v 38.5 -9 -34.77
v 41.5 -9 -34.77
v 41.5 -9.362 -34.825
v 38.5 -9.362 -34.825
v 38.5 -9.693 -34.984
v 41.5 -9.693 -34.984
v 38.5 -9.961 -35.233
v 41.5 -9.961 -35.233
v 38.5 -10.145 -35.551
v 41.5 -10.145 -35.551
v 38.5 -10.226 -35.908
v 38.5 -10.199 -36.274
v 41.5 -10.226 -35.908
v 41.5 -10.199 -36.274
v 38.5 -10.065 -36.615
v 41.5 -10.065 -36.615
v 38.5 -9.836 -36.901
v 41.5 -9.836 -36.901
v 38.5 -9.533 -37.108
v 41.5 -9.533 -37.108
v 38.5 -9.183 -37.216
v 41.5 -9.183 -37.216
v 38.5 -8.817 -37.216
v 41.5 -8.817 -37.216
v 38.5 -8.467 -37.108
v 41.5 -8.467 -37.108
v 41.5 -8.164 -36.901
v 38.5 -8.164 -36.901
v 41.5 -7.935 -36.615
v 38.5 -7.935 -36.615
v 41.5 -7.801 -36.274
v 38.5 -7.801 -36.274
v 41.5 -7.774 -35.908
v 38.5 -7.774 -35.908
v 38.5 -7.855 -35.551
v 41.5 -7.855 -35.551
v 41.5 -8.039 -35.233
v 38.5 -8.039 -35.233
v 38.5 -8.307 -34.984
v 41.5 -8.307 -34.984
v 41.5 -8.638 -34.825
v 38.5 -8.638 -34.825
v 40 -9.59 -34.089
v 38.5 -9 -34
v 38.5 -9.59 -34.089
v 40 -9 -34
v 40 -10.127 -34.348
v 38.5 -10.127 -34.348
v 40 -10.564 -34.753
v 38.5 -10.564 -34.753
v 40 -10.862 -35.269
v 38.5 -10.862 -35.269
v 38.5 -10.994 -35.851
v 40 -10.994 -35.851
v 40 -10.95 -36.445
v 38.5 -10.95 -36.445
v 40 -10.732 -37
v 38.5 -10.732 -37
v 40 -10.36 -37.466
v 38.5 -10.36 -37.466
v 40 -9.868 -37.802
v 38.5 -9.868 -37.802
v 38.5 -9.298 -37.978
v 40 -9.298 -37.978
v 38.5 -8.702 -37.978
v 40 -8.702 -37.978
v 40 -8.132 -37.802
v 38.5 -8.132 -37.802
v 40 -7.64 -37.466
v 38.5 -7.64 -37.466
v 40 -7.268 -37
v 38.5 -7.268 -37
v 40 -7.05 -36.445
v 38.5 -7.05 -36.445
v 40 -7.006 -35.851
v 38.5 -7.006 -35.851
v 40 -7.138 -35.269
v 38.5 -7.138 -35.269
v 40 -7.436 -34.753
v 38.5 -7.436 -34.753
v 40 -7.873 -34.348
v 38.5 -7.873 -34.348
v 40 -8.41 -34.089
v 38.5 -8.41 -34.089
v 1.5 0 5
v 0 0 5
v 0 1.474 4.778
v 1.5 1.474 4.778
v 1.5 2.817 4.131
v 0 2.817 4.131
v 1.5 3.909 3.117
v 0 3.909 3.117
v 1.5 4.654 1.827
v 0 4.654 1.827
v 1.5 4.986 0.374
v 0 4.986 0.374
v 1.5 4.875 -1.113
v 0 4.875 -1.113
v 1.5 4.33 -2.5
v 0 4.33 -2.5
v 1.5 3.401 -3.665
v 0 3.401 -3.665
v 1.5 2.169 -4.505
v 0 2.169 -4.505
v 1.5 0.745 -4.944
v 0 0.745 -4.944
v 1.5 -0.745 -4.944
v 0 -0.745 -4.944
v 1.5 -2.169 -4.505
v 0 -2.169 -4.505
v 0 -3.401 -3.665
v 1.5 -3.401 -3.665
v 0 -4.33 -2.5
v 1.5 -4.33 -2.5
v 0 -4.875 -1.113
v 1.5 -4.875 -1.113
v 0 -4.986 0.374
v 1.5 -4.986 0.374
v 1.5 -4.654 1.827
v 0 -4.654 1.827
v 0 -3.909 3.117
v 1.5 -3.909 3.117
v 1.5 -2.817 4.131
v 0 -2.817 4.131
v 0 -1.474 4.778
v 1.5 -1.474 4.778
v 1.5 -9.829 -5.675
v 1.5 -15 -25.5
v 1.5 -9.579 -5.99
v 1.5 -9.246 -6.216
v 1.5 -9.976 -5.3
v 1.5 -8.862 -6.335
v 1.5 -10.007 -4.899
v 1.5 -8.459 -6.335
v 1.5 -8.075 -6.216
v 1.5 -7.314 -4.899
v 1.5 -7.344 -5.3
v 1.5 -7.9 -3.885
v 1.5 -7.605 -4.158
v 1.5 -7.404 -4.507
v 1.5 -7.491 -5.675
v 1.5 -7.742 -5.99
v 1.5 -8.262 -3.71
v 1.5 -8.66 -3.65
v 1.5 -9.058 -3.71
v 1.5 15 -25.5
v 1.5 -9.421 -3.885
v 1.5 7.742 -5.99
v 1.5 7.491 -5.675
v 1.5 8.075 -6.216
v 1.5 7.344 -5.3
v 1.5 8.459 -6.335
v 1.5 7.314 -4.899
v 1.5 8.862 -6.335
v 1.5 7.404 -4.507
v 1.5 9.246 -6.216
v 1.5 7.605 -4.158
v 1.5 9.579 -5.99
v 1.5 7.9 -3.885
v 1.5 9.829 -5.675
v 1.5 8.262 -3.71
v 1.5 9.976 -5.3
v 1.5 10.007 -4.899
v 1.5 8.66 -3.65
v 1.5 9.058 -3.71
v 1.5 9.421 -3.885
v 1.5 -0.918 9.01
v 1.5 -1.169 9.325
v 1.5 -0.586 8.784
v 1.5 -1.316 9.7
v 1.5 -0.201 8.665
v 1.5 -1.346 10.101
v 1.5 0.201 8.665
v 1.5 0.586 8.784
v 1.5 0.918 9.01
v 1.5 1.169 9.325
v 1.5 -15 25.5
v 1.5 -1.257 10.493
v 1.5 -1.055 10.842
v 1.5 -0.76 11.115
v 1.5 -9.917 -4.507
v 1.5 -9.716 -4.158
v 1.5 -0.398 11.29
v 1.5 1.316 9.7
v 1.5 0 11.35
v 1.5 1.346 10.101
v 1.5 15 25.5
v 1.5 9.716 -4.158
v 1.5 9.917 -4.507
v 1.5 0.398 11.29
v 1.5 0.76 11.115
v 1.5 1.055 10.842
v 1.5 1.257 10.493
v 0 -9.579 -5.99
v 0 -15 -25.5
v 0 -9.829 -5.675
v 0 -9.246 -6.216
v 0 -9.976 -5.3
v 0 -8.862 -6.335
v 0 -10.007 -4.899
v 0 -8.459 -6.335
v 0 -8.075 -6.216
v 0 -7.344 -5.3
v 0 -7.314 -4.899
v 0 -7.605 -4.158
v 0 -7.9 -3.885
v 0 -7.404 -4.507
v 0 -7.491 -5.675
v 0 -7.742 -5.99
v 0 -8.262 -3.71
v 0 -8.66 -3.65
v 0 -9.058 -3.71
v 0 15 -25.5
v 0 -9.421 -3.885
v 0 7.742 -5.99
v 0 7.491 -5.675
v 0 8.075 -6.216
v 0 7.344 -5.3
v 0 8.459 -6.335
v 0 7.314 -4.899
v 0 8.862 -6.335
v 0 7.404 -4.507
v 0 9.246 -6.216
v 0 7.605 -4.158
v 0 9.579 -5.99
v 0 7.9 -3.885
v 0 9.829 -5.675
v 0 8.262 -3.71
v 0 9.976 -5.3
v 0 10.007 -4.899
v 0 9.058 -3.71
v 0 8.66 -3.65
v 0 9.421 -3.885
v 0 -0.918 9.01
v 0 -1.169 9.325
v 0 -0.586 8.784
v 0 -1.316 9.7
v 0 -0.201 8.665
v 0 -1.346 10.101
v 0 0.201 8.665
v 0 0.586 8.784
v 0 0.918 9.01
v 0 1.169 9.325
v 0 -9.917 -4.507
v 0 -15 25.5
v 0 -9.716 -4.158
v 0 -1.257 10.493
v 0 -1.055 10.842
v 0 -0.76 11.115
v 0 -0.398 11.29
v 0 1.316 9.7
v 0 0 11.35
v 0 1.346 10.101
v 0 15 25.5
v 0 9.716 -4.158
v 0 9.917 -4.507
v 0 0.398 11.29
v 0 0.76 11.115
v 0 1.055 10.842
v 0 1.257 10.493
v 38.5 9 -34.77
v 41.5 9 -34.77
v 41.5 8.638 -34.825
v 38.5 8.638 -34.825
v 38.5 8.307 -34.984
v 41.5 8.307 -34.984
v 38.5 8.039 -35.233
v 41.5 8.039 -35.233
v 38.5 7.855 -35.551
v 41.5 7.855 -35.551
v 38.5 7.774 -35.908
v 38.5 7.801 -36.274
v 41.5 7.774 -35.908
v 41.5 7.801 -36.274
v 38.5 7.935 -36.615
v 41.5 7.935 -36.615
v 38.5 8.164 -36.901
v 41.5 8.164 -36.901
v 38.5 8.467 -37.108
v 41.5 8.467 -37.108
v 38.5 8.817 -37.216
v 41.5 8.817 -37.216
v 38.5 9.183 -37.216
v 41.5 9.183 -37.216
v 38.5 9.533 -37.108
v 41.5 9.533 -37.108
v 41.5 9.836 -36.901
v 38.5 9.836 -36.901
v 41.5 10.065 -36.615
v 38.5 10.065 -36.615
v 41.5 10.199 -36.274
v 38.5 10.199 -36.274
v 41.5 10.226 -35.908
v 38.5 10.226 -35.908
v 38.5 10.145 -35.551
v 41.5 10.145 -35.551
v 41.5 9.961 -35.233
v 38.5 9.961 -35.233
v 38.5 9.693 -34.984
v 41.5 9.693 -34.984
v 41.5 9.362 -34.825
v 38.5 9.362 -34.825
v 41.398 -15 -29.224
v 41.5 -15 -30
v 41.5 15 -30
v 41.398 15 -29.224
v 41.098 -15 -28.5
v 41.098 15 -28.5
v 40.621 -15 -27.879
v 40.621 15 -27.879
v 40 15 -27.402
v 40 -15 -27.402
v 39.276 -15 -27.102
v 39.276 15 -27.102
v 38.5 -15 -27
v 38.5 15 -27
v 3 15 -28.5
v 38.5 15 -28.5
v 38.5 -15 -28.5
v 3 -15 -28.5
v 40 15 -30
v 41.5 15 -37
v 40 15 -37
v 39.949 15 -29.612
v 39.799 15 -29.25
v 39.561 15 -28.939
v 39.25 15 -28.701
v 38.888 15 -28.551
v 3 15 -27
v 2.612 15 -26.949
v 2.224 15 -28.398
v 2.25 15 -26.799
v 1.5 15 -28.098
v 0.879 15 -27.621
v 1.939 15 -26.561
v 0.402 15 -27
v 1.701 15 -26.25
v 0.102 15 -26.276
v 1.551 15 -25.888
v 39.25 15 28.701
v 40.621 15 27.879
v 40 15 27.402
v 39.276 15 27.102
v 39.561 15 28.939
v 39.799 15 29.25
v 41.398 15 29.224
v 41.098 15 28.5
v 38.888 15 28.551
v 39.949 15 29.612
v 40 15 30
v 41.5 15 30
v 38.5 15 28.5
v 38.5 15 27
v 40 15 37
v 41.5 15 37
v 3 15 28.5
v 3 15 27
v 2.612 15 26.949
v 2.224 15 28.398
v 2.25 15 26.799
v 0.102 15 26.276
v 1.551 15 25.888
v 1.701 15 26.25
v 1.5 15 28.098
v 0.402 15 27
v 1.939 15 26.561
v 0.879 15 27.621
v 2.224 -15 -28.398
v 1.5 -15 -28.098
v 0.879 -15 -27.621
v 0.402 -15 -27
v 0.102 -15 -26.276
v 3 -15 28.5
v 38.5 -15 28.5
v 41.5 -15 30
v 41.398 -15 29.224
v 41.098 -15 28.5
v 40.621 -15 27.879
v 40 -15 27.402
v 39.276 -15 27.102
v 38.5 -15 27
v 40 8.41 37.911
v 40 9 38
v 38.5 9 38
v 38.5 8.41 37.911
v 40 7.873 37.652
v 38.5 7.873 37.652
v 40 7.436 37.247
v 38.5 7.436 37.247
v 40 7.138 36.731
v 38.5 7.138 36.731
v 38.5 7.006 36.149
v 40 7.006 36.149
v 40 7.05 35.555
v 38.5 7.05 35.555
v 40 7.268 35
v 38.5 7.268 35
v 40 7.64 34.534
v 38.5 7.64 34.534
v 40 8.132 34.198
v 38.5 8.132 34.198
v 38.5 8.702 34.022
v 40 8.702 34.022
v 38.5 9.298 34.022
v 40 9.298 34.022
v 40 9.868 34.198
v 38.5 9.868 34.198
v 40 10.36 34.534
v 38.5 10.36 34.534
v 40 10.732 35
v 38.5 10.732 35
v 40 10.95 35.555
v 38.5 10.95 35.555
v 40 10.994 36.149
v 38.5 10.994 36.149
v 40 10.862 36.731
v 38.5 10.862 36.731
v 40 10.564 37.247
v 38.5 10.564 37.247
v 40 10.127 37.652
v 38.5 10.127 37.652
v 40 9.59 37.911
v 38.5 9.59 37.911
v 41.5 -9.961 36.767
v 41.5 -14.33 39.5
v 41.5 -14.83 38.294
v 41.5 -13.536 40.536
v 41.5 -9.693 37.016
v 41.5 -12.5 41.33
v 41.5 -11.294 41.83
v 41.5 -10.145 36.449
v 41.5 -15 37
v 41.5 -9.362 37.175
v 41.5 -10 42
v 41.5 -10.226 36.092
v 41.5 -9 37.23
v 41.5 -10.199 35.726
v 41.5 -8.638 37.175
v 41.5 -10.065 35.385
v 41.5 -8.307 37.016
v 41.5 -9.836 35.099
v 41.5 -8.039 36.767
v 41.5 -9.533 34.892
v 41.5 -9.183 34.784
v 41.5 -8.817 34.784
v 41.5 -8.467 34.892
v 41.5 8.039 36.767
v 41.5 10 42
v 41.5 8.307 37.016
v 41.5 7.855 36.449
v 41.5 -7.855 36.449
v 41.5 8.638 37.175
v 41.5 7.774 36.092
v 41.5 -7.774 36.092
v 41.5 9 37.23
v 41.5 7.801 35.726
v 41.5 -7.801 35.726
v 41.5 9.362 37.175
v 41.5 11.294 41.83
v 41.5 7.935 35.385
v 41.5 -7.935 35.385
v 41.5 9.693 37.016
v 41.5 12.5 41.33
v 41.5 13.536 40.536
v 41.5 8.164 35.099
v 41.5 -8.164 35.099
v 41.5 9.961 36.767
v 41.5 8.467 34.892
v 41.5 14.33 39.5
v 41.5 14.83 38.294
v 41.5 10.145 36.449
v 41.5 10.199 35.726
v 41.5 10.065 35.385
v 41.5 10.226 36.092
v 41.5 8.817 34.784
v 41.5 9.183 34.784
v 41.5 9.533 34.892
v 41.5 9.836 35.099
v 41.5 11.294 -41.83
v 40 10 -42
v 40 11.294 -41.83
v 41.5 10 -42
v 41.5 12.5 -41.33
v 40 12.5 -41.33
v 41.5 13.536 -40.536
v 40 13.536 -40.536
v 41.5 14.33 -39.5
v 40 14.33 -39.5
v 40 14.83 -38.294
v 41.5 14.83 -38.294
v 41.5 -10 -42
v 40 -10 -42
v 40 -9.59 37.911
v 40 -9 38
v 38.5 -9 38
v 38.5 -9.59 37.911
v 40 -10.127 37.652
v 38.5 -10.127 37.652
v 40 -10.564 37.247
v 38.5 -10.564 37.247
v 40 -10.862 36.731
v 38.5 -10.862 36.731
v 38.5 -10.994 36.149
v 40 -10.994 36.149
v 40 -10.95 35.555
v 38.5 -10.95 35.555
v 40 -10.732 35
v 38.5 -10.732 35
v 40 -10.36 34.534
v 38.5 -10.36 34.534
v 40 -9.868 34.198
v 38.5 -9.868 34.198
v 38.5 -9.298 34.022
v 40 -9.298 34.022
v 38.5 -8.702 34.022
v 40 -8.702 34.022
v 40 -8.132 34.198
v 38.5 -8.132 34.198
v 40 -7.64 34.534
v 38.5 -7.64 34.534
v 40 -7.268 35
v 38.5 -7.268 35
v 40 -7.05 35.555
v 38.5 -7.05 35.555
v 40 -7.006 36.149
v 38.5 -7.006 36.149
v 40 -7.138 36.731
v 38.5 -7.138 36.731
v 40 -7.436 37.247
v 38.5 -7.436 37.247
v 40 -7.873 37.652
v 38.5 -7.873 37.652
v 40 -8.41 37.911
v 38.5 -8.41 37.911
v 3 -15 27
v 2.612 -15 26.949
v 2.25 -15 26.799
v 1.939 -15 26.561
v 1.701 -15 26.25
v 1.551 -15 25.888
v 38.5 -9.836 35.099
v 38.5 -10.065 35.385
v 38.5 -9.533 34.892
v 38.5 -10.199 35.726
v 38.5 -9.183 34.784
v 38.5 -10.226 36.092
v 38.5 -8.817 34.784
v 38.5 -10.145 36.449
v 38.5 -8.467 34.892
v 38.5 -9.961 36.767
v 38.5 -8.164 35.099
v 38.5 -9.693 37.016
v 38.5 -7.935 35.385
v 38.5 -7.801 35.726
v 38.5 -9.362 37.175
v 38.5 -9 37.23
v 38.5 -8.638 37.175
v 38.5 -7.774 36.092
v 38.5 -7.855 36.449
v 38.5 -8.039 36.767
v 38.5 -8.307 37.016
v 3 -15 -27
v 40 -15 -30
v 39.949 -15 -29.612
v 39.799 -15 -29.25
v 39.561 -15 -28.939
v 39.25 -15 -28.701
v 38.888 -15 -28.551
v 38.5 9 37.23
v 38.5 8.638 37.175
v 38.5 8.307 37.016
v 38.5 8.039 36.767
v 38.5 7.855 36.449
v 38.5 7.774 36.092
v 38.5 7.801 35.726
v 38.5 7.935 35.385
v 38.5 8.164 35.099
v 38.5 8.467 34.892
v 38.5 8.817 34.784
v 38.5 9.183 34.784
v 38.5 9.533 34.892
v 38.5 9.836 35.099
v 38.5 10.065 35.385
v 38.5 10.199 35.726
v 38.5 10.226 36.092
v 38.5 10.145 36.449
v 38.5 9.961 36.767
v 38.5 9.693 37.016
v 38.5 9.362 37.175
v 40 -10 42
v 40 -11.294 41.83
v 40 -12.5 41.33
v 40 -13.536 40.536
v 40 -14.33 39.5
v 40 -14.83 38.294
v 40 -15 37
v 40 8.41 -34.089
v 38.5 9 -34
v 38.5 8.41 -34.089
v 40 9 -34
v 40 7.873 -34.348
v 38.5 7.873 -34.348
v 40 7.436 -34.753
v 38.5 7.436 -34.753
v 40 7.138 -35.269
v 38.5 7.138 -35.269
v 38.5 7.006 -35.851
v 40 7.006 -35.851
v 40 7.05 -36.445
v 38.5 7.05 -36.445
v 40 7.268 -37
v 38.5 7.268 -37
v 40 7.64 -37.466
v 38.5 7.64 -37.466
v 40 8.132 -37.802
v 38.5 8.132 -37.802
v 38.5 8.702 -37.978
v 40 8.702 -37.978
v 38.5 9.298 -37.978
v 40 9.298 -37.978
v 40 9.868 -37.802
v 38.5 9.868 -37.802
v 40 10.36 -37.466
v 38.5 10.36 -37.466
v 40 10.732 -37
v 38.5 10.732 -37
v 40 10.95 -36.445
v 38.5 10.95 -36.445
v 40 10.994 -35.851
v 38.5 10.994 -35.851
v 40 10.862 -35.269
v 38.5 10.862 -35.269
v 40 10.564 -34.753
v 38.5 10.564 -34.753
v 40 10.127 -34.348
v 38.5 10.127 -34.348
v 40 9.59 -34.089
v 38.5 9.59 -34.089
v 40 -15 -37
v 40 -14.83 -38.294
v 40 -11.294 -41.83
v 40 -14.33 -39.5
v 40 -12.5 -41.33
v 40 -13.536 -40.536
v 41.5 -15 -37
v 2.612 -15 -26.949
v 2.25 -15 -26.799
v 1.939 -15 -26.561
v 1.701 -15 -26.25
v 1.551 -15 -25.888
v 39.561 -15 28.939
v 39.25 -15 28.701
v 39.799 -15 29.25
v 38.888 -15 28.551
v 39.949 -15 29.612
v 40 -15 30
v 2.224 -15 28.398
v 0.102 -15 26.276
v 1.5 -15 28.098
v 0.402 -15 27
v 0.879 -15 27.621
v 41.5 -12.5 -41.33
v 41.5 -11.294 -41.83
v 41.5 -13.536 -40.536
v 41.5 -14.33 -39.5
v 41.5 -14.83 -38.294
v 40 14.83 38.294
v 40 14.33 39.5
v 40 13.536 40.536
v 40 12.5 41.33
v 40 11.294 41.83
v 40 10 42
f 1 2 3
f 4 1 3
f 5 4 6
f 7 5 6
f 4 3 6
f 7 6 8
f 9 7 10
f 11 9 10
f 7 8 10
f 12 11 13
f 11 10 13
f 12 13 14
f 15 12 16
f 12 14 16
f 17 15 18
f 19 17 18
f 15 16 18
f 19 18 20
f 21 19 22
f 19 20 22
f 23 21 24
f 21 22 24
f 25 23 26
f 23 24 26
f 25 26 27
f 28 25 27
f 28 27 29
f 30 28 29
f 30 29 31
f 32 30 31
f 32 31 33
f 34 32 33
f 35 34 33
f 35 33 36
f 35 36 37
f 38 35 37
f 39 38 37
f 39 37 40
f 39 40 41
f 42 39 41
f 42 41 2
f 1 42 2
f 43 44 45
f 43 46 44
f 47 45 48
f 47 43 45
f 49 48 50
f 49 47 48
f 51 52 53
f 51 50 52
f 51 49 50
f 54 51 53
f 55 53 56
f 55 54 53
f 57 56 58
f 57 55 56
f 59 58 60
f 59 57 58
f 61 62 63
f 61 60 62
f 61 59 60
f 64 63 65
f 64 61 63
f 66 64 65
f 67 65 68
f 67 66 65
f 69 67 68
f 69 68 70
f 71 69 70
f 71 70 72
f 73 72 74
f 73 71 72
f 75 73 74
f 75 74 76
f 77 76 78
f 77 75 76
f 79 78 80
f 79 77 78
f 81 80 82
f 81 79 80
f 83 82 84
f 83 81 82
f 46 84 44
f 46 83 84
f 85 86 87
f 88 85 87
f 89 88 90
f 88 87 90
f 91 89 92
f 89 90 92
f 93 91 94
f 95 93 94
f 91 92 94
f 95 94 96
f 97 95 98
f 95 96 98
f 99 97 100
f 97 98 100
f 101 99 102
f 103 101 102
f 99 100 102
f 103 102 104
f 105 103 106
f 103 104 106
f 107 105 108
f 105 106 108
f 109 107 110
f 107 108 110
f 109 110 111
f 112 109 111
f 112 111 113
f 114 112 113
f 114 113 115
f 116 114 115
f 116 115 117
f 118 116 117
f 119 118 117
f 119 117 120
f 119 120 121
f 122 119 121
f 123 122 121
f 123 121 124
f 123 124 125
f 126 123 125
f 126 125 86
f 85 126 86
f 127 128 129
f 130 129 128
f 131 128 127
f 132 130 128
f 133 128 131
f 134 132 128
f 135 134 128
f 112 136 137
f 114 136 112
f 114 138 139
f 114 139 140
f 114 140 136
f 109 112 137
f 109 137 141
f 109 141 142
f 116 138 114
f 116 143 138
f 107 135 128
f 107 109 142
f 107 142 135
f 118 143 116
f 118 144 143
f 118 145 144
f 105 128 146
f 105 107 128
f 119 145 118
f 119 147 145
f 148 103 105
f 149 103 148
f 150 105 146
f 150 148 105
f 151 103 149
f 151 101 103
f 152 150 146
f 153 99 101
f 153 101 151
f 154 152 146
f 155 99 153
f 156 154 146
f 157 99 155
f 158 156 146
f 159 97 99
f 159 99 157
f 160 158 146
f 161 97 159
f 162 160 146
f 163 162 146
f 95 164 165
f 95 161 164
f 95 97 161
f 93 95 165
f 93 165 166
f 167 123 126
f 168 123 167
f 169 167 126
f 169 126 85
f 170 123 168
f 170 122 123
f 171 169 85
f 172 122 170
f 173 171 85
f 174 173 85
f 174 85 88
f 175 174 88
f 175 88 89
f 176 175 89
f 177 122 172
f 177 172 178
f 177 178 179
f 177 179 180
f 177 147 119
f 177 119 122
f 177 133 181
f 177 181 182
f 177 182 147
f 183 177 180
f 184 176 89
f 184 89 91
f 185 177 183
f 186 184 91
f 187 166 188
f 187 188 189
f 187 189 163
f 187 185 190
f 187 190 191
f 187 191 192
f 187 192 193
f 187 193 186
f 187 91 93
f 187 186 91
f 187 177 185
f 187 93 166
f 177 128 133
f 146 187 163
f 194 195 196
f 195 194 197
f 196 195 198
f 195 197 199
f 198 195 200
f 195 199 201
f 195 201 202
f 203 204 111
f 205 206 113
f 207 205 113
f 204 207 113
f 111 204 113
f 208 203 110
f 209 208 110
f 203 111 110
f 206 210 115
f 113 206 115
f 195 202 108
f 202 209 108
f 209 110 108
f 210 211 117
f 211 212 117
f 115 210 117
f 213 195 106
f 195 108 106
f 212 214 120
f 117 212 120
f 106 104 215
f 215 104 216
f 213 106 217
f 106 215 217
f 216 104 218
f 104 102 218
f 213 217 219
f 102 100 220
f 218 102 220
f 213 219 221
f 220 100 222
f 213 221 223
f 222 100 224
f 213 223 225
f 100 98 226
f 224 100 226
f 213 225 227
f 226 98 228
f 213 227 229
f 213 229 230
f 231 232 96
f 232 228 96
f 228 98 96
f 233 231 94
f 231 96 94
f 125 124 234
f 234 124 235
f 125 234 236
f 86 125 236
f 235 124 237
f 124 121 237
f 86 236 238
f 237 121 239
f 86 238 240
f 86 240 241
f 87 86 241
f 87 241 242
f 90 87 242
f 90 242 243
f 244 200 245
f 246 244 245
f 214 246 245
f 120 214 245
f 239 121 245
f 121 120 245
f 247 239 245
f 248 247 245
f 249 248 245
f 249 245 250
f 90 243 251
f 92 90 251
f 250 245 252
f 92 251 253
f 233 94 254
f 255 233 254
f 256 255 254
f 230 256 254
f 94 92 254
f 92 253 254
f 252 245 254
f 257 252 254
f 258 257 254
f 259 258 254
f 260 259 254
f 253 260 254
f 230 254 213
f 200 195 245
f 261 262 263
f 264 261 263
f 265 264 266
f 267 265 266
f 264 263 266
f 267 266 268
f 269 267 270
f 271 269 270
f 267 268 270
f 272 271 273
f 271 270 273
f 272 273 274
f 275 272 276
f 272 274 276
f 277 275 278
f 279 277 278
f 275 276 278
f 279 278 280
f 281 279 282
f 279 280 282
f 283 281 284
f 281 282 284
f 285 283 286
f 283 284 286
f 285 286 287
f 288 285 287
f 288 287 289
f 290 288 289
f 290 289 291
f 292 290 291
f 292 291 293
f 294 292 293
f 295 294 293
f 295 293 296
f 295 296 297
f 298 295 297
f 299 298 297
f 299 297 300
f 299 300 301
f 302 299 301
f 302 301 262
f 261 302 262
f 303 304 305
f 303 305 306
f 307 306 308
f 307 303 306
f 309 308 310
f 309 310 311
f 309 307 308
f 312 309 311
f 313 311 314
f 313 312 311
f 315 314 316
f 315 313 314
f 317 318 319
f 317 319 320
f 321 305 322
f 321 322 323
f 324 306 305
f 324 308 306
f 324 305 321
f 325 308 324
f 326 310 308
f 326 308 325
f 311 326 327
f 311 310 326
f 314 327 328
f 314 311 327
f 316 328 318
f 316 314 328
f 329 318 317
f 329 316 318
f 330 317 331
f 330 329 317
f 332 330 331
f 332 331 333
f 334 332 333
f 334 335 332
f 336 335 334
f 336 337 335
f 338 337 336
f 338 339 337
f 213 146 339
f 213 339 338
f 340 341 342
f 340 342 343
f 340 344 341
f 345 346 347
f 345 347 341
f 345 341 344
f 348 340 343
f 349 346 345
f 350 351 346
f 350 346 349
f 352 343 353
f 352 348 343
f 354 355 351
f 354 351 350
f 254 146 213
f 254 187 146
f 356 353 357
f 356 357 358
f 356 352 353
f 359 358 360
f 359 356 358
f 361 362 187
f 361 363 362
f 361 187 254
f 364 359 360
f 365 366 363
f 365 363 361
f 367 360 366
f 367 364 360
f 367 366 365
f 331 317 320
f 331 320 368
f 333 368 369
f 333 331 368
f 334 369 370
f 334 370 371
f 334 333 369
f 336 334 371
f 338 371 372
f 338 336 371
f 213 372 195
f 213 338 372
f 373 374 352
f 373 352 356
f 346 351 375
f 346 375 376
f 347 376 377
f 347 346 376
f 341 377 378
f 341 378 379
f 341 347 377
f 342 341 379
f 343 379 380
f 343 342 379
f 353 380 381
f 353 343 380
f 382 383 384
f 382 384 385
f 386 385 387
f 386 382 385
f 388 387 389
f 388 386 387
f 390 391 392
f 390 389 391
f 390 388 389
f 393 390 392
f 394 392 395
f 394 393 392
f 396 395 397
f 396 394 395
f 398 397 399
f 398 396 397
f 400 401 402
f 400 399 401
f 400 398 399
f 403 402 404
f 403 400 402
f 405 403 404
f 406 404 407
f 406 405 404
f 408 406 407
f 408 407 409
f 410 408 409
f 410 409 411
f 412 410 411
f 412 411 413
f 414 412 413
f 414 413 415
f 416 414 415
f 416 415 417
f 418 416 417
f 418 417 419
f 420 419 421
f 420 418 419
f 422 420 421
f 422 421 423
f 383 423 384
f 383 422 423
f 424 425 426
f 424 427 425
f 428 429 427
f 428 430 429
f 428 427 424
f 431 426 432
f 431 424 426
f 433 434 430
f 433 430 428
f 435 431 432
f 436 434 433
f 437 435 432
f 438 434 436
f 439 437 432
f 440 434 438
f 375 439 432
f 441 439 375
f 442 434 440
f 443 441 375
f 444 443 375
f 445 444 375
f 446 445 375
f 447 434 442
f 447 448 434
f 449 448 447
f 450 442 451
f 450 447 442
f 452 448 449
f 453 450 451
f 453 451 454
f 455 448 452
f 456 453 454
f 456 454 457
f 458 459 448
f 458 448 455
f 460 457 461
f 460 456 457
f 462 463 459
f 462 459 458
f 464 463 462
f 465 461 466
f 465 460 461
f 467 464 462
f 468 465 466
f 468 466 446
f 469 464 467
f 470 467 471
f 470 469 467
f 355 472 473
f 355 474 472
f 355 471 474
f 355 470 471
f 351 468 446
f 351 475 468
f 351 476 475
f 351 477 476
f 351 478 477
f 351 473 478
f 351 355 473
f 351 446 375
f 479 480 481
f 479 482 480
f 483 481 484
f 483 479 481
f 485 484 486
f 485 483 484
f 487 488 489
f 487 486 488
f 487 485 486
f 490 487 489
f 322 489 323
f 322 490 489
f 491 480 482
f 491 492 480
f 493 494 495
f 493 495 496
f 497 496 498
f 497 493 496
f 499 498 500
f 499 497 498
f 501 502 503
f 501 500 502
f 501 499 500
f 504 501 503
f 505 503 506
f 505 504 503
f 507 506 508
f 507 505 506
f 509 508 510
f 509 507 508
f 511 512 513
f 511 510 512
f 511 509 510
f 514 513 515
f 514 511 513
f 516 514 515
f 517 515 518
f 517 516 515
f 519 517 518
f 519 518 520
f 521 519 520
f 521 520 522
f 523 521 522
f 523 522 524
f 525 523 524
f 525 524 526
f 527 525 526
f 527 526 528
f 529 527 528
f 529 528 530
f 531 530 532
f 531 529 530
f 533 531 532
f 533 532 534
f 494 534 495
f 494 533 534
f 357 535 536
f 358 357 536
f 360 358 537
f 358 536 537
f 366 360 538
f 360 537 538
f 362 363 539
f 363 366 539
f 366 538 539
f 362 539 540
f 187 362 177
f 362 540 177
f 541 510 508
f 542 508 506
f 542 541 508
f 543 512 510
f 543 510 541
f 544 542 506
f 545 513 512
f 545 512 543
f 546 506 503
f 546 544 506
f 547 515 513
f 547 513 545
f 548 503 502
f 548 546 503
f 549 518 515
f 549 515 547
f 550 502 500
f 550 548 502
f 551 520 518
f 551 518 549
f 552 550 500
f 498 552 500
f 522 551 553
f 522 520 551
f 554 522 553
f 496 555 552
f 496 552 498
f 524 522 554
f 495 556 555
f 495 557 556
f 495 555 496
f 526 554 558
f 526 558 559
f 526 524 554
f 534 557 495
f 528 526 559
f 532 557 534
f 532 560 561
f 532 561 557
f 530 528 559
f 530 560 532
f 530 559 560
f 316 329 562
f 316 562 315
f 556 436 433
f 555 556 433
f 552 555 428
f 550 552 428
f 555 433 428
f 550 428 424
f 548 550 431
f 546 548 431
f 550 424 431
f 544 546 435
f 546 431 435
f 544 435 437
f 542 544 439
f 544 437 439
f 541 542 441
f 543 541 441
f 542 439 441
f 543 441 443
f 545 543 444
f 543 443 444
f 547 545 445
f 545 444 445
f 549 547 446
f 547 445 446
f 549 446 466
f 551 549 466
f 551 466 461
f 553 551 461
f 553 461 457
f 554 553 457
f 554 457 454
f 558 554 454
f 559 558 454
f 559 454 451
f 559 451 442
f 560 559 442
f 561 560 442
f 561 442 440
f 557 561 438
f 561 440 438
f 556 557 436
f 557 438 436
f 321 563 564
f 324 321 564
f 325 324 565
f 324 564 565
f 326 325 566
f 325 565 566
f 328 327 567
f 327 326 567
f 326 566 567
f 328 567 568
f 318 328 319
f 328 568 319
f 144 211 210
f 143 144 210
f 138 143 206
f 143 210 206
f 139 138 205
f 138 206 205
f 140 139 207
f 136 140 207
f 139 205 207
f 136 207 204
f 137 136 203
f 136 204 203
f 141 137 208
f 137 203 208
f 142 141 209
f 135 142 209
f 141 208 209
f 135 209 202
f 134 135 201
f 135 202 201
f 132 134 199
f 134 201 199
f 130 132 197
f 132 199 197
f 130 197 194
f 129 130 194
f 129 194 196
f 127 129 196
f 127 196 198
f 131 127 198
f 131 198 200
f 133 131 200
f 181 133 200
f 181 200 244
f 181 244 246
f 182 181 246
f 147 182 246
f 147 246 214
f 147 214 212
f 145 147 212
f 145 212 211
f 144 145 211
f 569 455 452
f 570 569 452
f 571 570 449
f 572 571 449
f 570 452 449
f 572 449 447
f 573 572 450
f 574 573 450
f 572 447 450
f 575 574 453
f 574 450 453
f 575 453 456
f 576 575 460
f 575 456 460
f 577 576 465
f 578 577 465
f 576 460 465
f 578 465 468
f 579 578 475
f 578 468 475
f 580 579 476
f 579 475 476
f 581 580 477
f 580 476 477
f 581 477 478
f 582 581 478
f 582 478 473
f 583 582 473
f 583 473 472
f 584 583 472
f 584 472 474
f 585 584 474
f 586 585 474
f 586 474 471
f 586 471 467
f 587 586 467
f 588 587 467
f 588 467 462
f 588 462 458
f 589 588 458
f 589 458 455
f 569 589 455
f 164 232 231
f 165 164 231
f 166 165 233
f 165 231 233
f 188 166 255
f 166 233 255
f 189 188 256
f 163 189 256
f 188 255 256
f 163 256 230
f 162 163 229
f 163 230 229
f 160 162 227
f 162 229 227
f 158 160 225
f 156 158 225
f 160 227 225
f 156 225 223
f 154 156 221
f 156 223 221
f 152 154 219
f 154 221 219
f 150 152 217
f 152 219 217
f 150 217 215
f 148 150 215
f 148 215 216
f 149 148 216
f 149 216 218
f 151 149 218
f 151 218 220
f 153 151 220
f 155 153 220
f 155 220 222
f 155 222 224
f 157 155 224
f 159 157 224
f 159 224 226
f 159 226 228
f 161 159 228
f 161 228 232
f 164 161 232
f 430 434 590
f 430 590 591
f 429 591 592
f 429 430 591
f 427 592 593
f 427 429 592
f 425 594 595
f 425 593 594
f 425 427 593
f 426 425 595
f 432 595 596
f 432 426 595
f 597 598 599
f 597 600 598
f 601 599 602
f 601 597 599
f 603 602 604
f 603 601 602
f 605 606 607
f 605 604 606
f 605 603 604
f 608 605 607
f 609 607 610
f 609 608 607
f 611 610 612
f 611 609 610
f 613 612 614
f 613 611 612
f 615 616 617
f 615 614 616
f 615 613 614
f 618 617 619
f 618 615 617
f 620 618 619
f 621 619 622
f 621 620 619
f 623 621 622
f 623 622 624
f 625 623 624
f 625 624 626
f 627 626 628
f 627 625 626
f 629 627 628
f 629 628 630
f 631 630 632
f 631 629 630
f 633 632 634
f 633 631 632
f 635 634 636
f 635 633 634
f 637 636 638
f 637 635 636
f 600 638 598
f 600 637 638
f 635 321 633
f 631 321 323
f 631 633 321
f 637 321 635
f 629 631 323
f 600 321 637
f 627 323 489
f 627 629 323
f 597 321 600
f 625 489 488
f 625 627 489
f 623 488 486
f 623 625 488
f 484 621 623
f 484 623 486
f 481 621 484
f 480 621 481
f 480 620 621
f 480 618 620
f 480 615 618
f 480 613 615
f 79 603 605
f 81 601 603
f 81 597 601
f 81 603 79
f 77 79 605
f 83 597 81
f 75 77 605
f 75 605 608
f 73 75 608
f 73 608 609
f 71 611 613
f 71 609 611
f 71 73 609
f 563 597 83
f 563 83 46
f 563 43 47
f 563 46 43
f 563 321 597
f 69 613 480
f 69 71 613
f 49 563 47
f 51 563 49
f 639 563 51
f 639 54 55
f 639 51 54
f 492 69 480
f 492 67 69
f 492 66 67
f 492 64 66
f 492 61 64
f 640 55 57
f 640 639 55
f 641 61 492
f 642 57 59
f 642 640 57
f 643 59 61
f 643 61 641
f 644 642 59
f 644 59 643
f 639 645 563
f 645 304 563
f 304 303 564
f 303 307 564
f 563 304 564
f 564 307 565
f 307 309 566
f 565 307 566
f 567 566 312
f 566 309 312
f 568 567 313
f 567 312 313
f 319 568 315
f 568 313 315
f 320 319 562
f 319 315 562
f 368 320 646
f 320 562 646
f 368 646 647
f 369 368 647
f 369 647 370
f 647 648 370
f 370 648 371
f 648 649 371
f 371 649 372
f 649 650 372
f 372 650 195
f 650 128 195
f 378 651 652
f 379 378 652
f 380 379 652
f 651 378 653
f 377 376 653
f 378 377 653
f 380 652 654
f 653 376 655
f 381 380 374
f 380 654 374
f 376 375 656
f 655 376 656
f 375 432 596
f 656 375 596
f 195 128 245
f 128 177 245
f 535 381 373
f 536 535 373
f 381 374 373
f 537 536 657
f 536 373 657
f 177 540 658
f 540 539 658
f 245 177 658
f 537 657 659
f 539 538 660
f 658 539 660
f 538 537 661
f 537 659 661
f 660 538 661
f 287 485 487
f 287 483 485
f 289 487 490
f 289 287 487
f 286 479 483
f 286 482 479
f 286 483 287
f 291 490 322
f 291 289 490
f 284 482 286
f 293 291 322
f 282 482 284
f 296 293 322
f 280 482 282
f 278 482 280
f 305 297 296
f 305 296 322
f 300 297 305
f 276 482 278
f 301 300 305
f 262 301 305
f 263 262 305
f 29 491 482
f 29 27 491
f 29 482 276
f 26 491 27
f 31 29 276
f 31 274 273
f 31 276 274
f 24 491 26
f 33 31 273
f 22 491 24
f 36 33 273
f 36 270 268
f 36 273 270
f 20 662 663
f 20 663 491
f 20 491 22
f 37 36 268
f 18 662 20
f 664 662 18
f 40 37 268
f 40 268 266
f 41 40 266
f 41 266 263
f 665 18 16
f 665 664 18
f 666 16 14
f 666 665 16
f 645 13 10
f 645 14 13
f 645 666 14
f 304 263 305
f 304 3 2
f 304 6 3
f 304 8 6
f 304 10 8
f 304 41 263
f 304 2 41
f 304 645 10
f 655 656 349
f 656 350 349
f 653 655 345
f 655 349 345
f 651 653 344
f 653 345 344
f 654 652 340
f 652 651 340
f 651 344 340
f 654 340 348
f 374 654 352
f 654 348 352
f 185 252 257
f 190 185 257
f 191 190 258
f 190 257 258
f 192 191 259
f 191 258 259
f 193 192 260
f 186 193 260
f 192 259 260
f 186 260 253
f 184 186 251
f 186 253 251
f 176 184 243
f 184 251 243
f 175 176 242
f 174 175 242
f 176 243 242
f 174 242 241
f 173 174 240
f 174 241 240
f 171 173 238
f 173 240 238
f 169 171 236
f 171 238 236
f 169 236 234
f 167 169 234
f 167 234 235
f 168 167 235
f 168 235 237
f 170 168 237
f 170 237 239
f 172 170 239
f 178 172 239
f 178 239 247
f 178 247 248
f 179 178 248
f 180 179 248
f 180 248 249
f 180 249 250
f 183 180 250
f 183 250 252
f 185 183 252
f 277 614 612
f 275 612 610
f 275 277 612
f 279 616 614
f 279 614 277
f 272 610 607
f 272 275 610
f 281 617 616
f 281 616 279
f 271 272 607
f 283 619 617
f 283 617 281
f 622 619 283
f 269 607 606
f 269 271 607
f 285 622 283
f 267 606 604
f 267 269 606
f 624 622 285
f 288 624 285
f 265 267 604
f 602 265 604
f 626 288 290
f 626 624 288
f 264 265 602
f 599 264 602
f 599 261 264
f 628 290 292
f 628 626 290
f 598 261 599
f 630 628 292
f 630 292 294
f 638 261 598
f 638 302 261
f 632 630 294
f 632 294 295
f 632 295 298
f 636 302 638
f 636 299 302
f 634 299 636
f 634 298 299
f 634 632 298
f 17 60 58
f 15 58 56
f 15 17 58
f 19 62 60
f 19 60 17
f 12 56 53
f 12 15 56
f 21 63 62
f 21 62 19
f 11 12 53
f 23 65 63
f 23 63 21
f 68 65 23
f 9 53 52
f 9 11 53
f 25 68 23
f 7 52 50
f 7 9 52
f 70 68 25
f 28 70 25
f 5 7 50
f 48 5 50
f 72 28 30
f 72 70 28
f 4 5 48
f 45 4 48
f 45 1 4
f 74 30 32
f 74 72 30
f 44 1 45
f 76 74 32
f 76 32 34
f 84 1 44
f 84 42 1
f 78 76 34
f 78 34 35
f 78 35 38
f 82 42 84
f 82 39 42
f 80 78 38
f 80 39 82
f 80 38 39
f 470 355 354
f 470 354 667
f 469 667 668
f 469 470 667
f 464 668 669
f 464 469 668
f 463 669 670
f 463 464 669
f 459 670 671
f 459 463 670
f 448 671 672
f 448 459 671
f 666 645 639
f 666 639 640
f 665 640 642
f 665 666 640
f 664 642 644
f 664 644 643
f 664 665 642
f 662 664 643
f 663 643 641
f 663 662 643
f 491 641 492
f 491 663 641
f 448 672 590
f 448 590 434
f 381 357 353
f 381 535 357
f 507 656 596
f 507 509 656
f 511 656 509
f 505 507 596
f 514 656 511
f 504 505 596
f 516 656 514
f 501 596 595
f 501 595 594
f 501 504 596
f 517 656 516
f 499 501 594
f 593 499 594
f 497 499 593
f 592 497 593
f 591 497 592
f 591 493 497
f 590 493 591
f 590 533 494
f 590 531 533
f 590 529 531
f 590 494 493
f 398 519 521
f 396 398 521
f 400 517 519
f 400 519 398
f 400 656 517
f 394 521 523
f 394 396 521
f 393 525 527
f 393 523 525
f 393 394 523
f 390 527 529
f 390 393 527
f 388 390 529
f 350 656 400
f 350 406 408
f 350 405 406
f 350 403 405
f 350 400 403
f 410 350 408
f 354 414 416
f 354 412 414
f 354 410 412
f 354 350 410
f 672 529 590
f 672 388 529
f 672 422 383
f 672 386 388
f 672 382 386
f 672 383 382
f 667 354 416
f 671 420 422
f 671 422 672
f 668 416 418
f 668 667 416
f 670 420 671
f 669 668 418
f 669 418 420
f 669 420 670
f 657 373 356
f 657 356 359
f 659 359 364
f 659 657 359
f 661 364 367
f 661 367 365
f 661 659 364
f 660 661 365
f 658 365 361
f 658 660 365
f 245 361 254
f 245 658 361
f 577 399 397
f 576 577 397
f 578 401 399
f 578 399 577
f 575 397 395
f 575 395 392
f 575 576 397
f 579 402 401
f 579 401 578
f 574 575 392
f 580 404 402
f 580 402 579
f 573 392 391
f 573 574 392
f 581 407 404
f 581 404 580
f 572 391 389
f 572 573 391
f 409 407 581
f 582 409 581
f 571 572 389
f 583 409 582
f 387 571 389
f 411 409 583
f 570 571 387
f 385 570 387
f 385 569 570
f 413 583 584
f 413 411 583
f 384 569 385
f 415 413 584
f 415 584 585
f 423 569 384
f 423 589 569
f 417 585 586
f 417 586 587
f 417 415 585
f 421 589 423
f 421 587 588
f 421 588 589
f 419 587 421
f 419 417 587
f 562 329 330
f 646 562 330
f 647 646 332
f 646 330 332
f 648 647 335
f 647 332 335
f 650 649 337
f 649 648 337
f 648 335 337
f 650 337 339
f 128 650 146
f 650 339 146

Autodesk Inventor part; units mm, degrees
ref_plane "YZ Plane" through (0, 0, 0) normal (1, 0, 0) x (0, 1, 0)
ref_plane "XZ Plane" through (0, 0, 0) normal (0, 1, 0) x (-1, 0, 0)
ref_plane "XY Plane" through (0, 0, 0) normal (0, 0, 1) x (1, 0, 0)
sketch "スケッチ1" plane through (0, 0, 0) normal (1, 0, 0) x (0, 1, 0)
  line L0 (-15, -27) -> (-15, 27)
  line L1 (-15, 27) -> (15, 27)
  line L2 (15, 27) -> (15, -27)
  line L3 (15, -27) -> (-15, -27)
  line L4 (-15, -27) -> (15, 27) construction
  line L5 (-15, 27) -> (15, -27) construction
  point P0 (0, 0)
  dimension "d0" = 30
  dimension "d1" = 54
extrude "プレート1" add sketch "スケッチ1" along normal blind 1.5
sketch "スケッチ2" plane through (1.5, -15, 27) normal (0, 0, 1) x (1, 0, 0)
  line L0 (0, 30) -> (0, 0)
  line L1 (0, 0) -> (38.5, 0)
  line L2 (38.5, 0) -> (38.5, 30)
  line L3 (38.5, 30) -> (0, 30)
edge flange "フランジ1" height 40 angle 90 thickness 1.5 bend radius 1.5 thickness toward (0, 0, 1) relief tear relief width 1.5 relief depth 0.75 corner gap 1.5 corner form 0 edges at (1.5, 0, 27) (1.5, 0, -27) wall of the first edge with corners at (1.5, 15, 27) (1.5, -15, 27) (40, -15, 27) (40, 15, 27)
bend "曲げ1"
corner "コーナー1"
sketch "スケッチ3" plane through (40, 15, 28.5) normal (1, 0, 0) x (0, 1, 0)
  line L0 (-30, 0) -> (0, 0)
  line L1 (0, 0) -> (0, 13.5)
  line L2 (0, 13.5) -> (-30, 13.5)
  line L3 (-30, 13.5) -> (-30, 0)
edge flange "フランジ2" height 15 angle 90 thickness 1.5 bend radius 1.5 thickness toward (1, 0, 0) relief tear relief width 1.5 relief depth 0.75 corner gap 1.5 corner form 0 edges at (40, 0, 28.5) (40, 0, -28.5) wall of the first edge with corners at (40, -15, 28.5) (40, 15, 28.5) (40, 15, 42) (40, -15, 42)
bend "曲げ2"
corner "コーナー2"
sketch "スケッチ4" plane through (0, 0, 0) normal (-1, 0, 0) x (0, 0, 1)
  circle A0 centre (0, 0) radius 5
  circle A1 centre (10, 0) radius 1.35
  circle A2 centre (-5, 8.6603) radius 1.35
  circle A3 centre (-5, -8.6603) radius 1.35
  dimension "d23" = 10
  dimension "d24" = 2.7
  dimension "d25" = 0
  dimension "d26" = 10
  dimension "d29" = 360
extrude "押し出し1" cut sketch "スケッチ4" against normal blind 2
sketch "スケッチ6" plane through (40, -15, 42) normal (-1, 0, 0) x (0, 0, 1)
  circle A0 centre (-6, 24) radius 2
  line L0 (-12, 30) -> (0, 30) projected
  line L1 (0, 0) -> (0, 30) projected
  circle A1 centre (-6, 6) radius 2
  circle A2 centre (-78, 24) radius 2
  circle A3 centre (-78, 6) radius 2
  point P0 (-42, 15)
  dimension "d41" = 4
  dimension "d42" = 4
  dimension "d43" = 4
  dimension "d46" = 18
  dimension "d49" = 72
extrude "押し出し3" add sketch "スケッチ6" along normal blind 1.5
sketch "スケッチ7" plane through (38.5, 9, 36) normal (-1, 0, 0) x (0, 0, 1)
  circle A0 centre (0, 0) radius 2 projected
  circle A1 centre (0, -18) radius 2 projected
  circle A2 centre (-72, -18) radius 2 projected
  circle A3 centre (-72, 0) radius 2 projected
  circle A4 centre (0, 0) radius 2 projected
  circle A5 centre (0, -18) radius 2 projected
  circle A6 centre (-72, -18) radius 2 projected
  point P0 (-36, -9)
hole "穴1" at (38.5, 9, 36) at (38.5, -9, 36) at (38.5, 9, -36) at (38.5, -9, -36) direction (1, 0, 0) diameter 2.459 depth 3 thread size "M3x0.5" designation "M3" class "6H" standard "GB Metric profile"
fillet "フィレット1" radius 5 4 edges at (40.75, 15, 42) (40.75, -15, 42) (40.75, 15, -42) (40.75, -15, -42)
equation "\"d59\" = Thickness"
equation "\"BendRadius\" = Thickness"
equation "\"BendReliefWidth\" = Thickness"
equation "\"BendReliefDepth\" = 0.5 * Thickness"
equation "\"CornerReliefSize\" = 4 * Thickness"
equation "\"MinimumRemnant\" = 2 * Thickness"
equation "\"TransitionRadius\" = BendRadius"
equation "\"JacobiRadiusSize\" = BendRadius"
equation "\"GapSize\" = Thickness"
properties part number "hand_box2" material "アルミニウム 5052"
